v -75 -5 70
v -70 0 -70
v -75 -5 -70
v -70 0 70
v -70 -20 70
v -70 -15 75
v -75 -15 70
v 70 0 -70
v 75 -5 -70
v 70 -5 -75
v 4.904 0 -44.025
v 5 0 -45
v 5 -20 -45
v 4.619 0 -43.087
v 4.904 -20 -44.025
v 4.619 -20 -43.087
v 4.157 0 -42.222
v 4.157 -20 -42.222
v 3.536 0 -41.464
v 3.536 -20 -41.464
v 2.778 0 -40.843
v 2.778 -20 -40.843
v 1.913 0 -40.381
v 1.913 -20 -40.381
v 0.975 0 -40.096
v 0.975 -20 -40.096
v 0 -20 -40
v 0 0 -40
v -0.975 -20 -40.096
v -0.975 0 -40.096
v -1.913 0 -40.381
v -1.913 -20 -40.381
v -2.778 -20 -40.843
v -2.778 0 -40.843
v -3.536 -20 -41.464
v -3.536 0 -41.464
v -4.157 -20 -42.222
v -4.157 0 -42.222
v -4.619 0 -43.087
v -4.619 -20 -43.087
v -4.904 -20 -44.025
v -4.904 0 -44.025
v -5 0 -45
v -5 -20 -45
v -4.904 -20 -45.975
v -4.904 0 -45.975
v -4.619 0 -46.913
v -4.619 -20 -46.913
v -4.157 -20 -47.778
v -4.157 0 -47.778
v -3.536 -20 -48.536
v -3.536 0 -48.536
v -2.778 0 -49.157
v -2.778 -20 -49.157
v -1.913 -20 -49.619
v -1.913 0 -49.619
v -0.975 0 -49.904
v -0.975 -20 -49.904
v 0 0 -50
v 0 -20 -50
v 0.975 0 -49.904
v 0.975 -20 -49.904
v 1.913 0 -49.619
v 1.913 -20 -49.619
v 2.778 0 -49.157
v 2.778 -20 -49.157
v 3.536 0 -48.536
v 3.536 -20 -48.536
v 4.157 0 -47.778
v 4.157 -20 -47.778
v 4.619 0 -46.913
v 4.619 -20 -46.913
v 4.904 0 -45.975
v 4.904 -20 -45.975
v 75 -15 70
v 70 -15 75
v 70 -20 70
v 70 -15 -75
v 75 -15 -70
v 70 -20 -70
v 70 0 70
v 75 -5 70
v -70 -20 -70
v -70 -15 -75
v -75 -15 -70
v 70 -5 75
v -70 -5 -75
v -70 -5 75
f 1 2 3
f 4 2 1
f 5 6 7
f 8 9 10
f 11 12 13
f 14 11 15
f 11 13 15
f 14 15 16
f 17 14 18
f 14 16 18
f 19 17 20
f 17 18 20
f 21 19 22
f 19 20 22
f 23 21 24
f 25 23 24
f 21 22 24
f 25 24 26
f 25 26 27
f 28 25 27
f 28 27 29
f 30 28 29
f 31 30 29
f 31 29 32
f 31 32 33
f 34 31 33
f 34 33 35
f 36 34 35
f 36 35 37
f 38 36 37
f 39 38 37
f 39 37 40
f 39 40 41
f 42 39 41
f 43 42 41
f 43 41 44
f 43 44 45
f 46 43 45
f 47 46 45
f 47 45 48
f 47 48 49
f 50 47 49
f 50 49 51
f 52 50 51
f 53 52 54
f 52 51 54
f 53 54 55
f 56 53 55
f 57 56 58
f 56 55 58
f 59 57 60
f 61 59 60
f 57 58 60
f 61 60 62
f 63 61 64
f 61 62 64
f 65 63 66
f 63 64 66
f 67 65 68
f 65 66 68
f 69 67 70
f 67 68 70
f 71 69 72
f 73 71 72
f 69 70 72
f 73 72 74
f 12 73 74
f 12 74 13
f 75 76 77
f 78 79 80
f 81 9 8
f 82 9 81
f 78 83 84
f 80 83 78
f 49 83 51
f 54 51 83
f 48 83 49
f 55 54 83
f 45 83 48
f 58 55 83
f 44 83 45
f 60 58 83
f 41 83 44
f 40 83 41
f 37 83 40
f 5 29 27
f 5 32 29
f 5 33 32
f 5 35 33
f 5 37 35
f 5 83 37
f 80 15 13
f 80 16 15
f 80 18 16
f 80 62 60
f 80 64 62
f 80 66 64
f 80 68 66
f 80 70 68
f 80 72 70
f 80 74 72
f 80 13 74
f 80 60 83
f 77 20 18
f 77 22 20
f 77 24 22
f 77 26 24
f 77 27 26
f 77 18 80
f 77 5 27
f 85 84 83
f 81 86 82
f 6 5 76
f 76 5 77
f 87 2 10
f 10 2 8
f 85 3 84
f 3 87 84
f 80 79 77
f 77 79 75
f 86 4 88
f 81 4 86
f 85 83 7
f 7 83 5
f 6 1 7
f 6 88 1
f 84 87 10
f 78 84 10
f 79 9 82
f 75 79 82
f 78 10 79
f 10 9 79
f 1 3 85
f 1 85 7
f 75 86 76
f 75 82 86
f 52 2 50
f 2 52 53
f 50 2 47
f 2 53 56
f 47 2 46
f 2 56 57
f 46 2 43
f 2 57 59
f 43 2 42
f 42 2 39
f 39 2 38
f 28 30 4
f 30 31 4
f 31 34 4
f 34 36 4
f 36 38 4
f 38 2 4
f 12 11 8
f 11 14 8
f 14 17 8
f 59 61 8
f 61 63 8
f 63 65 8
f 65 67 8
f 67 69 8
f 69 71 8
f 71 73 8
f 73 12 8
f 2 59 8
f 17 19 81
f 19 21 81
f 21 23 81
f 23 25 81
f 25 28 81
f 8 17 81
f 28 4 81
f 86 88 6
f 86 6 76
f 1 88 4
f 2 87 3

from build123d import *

# Parameters (mm, degrees)
F0_W     = 150
F0_H     = 150
F1_DEPTH = 20
F2_R     = 5
F3_DEPTH = 20.001
F4_SIZE  = 5


with BuildPart() as f1:
    # F0 (on Front) → F1 (new body)
    with BuildSketch(Plane.XZ):
        Rectangle(F0_W, F0_H)
    extrude(amount=F1_DEPTH)

    # F2 (on face) → F3 (cut, through all)
    with BuildSketch(Plane.XZ.offset(20)):
        with Locations((0, -45)):
            Circle(F2_R)
    extrude(amount=-F3_DEPTH, mode=Mode.SUBTRACT)

    # F4
    f4_edges = [f1.edges().sort_by_distance(p)[0] for p in [
        (75, -10, 75),
        (-75, -10, 75),
        (0, 0, 75),
        (0, -20, 75),
        (75, -10, -75),
        (75, 0, 0),
        (75, -20, 0),
        (-75, -10, -75),
        (0, 0, -75),
        (0, -20, -75),
        (-75, 0, 0),
        (-75, -20, 0),
    ]]
    chamfer(f4_edges, length=F4_SIZE)


solid = f1.part
